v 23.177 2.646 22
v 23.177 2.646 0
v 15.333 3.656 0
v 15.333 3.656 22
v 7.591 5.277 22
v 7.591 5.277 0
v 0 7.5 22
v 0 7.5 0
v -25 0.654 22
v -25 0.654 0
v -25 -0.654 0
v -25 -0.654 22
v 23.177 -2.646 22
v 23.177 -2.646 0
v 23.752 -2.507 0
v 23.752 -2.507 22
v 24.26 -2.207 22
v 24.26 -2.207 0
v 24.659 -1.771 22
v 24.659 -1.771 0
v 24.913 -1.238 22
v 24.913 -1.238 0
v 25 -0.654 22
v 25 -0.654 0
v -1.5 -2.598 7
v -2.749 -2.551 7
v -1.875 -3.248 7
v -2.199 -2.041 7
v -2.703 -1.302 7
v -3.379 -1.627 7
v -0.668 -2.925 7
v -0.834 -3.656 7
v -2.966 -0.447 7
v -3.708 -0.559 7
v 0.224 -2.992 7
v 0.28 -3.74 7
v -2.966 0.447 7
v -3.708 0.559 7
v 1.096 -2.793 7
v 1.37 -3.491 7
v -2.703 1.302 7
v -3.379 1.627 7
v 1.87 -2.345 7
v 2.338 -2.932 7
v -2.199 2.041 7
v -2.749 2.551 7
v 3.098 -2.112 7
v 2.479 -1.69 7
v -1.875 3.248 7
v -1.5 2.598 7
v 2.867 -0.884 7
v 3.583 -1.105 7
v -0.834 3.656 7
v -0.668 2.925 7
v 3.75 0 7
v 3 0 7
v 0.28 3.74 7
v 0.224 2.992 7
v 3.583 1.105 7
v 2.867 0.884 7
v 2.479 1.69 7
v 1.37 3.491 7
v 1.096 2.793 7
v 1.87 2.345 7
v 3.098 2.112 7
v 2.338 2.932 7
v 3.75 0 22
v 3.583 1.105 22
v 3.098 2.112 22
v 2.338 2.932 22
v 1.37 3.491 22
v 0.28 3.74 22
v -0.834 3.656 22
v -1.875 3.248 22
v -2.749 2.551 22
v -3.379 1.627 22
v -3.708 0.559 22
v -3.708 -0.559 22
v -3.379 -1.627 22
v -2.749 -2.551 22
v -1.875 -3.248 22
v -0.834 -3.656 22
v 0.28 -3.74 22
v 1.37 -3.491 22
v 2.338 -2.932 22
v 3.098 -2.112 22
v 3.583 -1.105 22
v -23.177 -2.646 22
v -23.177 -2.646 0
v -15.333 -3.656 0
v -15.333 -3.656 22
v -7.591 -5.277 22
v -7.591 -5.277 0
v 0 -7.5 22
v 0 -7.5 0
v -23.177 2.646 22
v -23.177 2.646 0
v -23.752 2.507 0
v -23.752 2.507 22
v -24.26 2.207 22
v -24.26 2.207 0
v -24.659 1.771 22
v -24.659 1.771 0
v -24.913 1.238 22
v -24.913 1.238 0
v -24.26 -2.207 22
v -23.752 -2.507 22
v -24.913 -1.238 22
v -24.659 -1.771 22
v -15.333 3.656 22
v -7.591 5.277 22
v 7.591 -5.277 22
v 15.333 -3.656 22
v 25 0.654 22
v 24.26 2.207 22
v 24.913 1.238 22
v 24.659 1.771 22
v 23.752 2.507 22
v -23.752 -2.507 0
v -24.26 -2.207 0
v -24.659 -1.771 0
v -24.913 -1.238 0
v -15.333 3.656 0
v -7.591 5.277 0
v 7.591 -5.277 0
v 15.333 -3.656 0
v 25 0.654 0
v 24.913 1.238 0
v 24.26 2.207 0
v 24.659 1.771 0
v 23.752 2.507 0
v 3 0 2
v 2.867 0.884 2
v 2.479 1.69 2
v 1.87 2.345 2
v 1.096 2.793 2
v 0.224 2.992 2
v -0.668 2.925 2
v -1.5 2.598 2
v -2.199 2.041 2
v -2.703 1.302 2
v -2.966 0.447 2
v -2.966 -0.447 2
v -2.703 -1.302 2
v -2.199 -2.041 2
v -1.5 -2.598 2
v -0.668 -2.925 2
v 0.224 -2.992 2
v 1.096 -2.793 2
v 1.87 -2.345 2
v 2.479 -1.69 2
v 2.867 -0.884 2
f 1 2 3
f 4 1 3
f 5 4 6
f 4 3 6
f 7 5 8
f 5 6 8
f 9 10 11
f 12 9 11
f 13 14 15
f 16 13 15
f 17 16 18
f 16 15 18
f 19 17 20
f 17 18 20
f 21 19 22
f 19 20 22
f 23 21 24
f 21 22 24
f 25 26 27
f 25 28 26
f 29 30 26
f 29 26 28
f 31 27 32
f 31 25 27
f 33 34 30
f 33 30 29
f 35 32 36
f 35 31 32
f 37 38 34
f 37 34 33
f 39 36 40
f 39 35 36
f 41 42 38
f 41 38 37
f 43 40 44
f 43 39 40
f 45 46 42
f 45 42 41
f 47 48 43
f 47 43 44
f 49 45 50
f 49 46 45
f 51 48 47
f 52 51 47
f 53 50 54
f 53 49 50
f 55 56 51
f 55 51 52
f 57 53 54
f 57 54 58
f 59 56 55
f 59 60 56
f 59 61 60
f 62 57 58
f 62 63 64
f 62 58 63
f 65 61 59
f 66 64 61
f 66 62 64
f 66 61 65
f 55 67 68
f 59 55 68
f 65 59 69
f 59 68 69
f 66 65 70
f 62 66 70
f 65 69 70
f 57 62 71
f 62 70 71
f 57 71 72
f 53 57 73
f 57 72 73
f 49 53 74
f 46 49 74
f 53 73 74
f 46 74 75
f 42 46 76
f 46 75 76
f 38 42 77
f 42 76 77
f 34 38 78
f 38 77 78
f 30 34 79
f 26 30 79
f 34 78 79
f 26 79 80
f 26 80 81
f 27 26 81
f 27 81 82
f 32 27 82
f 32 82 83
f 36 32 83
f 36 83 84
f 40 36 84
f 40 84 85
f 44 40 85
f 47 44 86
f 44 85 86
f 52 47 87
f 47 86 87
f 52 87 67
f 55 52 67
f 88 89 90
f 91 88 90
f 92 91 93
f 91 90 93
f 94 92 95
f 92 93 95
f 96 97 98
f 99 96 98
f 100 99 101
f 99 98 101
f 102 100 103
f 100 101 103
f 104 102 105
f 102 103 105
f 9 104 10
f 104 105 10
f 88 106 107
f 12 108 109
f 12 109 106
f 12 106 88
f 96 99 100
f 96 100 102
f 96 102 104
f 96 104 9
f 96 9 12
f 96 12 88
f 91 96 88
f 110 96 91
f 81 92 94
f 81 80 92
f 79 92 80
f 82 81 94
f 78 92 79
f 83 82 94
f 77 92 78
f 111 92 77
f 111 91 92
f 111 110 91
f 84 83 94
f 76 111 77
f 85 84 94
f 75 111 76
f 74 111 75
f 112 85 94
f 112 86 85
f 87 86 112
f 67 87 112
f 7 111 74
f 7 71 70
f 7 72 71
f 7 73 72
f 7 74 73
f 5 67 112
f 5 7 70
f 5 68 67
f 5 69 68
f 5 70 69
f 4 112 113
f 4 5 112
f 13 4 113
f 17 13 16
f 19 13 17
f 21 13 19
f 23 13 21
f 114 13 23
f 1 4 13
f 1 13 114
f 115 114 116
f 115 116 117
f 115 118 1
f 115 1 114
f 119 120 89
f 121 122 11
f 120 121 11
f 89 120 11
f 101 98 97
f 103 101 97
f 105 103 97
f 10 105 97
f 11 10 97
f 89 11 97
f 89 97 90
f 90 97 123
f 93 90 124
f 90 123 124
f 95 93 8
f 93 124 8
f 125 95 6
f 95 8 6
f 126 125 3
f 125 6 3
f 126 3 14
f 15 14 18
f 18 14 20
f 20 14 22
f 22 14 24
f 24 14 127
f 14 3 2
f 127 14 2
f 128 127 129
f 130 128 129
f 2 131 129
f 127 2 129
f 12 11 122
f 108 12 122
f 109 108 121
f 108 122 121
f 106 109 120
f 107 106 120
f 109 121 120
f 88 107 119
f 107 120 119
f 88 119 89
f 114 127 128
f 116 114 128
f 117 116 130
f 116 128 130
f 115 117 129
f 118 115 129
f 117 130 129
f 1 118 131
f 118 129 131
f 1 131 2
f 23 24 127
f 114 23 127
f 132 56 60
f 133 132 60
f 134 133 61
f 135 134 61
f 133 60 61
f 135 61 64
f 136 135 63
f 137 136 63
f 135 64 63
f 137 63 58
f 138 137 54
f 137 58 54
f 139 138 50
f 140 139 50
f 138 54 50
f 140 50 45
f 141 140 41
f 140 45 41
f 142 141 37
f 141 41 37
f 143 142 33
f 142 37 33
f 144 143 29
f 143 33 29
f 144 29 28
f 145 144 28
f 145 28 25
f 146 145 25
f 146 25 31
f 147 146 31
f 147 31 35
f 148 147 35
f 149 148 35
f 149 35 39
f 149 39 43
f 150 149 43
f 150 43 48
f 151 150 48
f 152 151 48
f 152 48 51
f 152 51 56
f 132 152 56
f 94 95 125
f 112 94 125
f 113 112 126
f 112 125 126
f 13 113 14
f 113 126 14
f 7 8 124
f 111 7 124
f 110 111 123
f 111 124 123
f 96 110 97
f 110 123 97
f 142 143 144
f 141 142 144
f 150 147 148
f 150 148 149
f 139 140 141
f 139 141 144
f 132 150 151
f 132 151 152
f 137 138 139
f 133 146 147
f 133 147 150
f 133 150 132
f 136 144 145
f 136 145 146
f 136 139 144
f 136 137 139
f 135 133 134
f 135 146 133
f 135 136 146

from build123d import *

# Parameters (mm, degrees)
F0_R     = 3.75
F0_R_2   = 3
F1_DEPTH = 22
F2_R     = 3
F3_DEPTH = 20
F2_R_2   = 3.75
F4_DEPTH = 15


with BuildPart() as f1:
    # F0 (on Top) → F1 (new body)
    with BuildSketch(Plane.XY):
        with BuildLine():
            ThreePointArc((23.177466, -2.64573), (24.475624, -2.003632), (25, -0.653619))
            Line((25, -0.653619), (25, 0.653619))
            ThreePointArc((25, 0.653619), (24.475624, 2.003632), (23.177466, 2.64573))
            ThreePointArc((23.177466, 2.64573), (11.445847, 4.390631), (0, 7.5))
            ThreePointArc((0, 7.5), (-11.445847, 4.390631), (-23.177466, 2.64573))
            ThreePointArc((-23.177466, 2.64573), (-24.475624, 2.003632), (-25, 0.653619))
            Line((-25, 0.653619), (-25, -0.653619))
            ThreePointArc((-25, -0.653619), (-24.475624, -2.003632), (-23.177466, -2.64573))
            ThreePointArc((-23.177466, -2.64573), (-11.445847, -4.390631), (0, -7.5))
            ThreePointArc((0, -7.5), (11.445847, -4.390631), (23.177466, -2.64573))
        make_face()
        Circle(F0_R, mode=Mode.SUBTRACT)
        Circle(F0_R)
        Circle(F0_R_2, mode=Mode.SUBTRACT)
        Circle(F0_R_2)
    extrude(amount=F1_DEPTH)

    # F2 (on face) → F3 (cut)
    with BuildSketch(Plane.XY.offset(22)):
        Circle(F2_R)
    extrude(amount=-F3_DEPTH, mode=Mode.SUBTRACT)

    # F2 (on face) → F4 (cut)
    with BuildSketch(Plane.XY.offset(22)):
        Circle(F2_R_2)
        Circle(F2_R, mode=Mode.SUBTRACT)
    extrude(amount=-F4_DEPTH, mode=Mode.SUBTRACT)


solid = f1.part
